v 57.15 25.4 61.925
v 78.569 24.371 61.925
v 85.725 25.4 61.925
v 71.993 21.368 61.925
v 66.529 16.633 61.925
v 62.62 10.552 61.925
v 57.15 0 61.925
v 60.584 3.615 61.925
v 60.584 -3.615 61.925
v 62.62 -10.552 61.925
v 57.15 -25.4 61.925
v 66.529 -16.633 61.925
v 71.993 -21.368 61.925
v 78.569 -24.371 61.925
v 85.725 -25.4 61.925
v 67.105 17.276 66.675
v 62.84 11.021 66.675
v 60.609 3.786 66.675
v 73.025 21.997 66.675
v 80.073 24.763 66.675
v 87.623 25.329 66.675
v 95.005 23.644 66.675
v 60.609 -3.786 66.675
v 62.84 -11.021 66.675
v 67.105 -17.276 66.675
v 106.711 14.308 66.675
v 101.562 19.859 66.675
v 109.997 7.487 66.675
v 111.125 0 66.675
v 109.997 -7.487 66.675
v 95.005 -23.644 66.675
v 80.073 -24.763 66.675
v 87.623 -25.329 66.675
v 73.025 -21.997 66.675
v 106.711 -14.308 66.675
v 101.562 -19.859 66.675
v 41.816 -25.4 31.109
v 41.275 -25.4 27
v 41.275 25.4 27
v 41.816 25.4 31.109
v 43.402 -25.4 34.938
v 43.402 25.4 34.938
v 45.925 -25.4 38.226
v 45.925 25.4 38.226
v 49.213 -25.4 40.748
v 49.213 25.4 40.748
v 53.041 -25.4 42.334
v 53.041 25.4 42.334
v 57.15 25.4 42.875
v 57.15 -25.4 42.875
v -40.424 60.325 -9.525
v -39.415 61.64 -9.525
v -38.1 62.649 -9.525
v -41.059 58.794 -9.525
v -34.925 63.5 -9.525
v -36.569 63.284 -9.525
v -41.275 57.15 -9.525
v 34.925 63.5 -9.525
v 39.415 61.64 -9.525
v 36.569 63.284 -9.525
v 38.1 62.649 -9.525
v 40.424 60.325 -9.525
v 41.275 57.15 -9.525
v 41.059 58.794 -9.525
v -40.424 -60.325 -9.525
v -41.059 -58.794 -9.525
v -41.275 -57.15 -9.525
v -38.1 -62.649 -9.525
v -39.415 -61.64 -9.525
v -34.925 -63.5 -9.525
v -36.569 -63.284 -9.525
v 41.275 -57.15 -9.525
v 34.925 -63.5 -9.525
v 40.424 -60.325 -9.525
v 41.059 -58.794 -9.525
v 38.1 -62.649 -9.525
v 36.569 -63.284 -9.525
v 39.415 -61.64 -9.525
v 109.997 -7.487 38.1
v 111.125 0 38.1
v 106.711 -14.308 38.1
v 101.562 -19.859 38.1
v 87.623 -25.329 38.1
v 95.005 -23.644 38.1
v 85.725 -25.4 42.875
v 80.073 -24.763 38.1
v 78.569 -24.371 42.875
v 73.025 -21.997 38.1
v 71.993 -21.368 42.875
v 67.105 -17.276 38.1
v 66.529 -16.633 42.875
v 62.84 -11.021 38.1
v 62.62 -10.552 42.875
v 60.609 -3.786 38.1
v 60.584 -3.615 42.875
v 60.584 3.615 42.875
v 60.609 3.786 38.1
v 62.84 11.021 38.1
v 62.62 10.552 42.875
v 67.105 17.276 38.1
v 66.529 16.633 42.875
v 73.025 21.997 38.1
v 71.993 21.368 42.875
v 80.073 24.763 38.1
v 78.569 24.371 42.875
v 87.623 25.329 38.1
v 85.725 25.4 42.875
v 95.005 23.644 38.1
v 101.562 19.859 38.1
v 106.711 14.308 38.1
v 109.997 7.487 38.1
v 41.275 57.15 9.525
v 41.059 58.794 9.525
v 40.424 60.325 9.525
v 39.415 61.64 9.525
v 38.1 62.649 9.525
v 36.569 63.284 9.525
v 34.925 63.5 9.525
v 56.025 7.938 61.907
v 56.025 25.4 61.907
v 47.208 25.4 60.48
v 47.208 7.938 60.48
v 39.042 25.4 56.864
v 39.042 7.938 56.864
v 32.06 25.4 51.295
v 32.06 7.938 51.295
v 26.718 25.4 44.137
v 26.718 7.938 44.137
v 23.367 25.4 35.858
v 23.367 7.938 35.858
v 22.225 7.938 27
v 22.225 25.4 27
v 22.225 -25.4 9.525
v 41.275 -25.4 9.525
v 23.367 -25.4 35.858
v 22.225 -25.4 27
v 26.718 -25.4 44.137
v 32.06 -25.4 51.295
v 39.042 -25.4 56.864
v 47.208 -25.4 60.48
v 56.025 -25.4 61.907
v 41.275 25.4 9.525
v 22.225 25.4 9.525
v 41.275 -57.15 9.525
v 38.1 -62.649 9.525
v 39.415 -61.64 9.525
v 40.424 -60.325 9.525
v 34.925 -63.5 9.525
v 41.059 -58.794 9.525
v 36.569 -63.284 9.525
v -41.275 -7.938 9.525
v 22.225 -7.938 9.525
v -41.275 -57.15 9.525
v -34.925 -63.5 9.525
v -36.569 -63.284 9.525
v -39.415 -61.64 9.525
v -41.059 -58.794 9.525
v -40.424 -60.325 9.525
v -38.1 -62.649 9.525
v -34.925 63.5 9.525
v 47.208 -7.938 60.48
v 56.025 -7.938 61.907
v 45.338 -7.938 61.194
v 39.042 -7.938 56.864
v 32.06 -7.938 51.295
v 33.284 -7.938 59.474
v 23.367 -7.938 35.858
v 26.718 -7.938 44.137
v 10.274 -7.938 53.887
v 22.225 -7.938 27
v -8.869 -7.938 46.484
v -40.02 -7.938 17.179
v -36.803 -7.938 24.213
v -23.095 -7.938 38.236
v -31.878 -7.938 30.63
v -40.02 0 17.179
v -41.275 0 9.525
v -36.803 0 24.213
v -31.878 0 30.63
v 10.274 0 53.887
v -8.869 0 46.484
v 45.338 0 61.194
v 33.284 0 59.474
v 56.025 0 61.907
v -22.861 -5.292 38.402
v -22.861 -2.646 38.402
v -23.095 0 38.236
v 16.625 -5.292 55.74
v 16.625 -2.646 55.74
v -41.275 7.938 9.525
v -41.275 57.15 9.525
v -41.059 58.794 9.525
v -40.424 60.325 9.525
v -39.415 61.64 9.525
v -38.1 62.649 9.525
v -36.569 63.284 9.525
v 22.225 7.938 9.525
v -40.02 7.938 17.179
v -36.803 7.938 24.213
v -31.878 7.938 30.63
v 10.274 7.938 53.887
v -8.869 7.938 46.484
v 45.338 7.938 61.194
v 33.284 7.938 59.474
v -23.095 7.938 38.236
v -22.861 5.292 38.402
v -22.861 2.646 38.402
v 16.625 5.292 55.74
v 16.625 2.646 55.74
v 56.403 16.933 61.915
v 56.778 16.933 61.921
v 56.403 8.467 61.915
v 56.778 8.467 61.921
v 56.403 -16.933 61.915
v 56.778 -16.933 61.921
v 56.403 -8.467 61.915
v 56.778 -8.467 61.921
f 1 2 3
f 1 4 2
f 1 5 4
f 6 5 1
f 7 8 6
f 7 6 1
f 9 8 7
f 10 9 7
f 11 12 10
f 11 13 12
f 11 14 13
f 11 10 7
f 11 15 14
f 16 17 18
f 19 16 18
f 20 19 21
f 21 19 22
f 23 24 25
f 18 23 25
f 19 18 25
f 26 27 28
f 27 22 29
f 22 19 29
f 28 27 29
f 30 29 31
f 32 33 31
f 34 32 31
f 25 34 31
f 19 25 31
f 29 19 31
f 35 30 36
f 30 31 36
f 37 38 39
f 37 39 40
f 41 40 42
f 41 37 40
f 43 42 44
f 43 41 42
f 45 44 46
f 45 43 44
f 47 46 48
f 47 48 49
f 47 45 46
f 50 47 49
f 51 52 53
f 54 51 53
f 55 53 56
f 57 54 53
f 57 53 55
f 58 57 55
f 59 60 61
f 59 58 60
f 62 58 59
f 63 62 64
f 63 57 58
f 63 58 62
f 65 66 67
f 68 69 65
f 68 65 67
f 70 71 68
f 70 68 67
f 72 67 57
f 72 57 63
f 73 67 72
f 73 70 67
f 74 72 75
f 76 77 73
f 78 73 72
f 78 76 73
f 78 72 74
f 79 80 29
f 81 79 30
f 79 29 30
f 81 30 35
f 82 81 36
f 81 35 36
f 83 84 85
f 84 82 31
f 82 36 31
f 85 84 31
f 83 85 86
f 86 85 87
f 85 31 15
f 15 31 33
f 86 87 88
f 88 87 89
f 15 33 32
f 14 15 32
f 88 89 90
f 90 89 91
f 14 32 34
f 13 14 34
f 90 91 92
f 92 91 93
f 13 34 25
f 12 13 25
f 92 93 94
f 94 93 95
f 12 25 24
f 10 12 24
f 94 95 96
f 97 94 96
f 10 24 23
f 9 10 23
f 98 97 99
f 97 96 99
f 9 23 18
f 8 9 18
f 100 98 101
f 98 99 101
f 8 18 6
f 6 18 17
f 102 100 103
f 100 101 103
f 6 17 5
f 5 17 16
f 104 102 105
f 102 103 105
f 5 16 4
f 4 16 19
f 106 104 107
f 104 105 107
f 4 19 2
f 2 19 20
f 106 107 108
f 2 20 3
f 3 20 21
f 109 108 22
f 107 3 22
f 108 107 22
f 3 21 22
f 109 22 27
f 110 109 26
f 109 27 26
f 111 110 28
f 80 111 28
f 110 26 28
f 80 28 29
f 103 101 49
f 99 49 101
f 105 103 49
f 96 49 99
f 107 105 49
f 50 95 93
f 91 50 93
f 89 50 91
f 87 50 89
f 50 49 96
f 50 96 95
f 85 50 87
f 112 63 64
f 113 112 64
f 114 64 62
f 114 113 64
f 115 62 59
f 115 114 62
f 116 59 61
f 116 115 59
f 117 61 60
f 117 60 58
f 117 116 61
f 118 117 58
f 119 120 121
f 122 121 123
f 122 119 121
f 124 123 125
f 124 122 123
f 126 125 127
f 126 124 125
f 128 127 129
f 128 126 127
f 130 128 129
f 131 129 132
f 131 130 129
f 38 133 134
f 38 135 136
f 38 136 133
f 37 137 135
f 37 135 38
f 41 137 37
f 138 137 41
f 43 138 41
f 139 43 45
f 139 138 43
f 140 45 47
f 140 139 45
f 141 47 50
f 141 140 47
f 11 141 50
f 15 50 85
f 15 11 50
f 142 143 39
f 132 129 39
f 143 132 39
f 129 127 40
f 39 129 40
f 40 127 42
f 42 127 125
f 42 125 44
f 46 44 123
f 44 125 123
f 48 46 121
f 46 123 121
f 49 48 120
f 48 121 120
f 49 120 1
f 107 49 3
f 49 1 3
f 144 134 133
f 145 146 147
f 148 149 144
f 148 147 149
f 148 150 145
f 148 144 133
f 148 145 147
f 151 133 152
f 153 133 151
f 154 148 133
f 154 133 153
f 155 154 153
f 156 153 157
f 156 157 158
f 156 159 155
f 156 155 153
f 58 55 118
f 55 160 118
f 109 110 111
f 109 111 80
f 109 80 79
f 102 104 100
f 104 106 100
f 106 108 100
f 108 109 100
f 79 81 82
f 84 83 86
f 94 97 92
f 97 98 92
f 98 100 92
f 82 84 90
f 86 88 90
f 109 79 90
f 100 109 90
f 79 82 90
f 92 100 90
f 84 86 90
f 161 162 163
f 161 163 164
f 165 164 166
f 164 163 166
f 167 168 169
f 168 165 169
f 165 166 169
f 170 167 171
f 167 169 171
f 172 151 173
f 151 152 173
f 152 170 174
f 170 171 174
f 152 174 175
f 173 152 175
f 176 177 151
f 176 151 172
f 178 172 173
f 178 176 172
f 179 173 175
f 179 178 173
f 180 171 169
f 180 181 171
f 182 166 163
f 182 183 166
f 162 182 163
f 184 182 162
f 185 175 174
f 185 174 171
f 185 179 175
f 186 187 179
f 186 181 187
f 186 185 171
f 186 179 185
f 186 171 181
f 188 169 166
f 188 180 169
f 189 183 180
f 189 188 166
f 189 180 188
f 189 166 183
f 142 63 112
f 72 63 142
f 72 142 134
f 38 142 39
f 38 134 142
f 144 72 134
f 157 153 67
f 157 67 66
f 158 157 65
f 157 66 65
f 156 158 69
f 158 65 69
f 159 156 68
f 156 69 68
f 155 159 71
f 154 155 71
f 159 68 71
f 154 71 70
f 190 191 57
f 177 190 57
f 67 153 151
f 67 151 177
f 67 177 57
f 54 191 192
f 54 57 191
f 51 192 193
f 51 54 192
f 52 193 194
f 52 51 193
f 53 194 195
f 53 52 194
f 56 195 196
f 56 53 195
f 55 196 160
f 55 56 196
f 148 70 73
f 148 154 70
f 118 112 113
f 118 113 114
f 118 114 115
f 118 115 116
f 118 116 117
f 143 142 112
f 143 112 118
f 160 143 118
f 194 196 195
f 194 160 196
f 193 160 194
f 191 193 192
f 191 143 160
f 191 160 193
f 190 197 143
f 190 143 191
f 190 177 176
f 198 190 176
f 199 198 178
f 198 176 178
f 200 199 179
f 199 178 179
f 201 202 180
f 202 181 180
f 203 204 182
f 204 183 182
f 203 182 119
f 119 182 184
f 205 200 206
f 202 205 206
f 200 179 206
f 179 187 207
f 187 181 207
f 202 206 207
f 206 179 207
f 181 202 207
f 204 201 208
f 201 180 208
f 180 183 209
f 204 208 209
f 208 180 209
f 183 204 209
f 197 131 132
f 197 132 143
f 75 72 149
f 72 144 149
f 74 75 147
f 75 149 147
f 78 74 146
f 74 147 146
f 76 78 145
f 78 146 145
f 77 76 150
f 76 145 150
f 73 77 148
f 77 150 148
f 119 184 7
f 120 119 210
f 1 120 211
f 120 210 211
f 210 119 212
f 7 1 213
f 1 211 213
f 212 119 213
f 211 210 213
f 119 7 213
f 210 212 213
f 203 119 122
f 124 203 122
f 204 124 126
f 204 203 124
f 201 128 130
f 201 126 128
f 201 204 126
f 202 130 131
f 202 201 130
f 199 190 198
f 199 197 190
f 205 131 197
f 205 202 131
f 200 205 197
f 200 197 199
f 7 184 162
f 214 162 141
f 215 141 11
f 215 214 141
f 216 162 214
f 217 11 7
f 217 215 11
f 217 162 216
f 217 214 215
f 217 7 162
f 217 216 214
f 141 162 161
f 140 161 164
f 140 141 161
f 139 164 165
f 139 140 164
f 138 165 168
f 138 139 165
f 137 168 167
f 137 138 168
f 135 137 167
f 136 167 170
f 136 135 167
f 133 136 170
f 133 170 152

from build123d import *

# Parameters (mm, degrees)
F1_DEPTH = 63.5
F2_DEPTH = 25.4
F3_DEPTH = 7.9375
F5_R     = 6.35


with BuildPart() as f1:
    # F0 (on Front) → F1 (new body, symmetric)
    with BuildSketch(Plane.XZ):
        Polygon((-41.275, -9.525), (41.275, -9.525), (41.275, 9.525), (22.225, 9.525), (-41.275, 9.525), align=None)
    extrude(amount=F1_DEPTH, both=True)

    # F0 (on Front) → F2 (join, symmetric)
    with BuildSketch(Plane.XZ):
        with BuildLine():
            Line((22.225, 9.525), (41.275, 9.525))
            Line((41.275, 9.525), (41.275, 27.0002))
            ThreePointArc((41.275, 27.0002), (45.92468, 38.22552), (57.15, 42.8752))
            Line((57.15, 42.8752), (60.325, 42.8752))
            Line((60.325, 42.8752), (60.325, 61.9252))
            Line((60.325, 61.9252), (57.15, 61.9252))
            add(Edge.make_bspline(
                [(56.025, 61.907076), (56.404449, 61.915352), (56.7795, 61.921393), (57.15, 61.9252)],
                knots=[110.209963, 110.209963, 110.209963, 110.209963, 111.504536, 111.504536, 111.504536, 111.504536], degree=3))
            ThreePointArc((56.025, 61.907076), (32.059701, 51.294901), (22.225, 27.0002))
            Line((22.225, 27.0002), (22.225, 9.525))
        make_face()
        Polygon((60.325, 61.9252), (60.325, 42.8752), (70.739483, 42.8752), (85.725, 42.8752), (85.725, 52.3875), (85.725, 61.9252), (70.739483, 61.9252), align=None)
    extrude(amount=F2_DEPTH, both=True)

    # F0 (on Front) → F3 (join, symmetric)
    with BuildSketch(Plane.XZ):
        with BuildLine():
            add(Edge.make_bspline(
                [(-41.275, 9.525), (-40.450122, 44.294677), (23.721684, 61.202513), (56.025, 61.907076)],
                knots=[0, 0, 0, 0, 110.209963, 110.209963, 110.209963, 110.209963], degree=3))
            Line((-41.275, 9.525), (22.225, 9.525))
            Line((22.225, 9.525), (22.225, 27.0002))
            ThreePointArc((22.225, 27.0002), (32.059701, 51.294901), (56.025, 61.907076))
        make_face()
    extrude(amount=F3_DEPTH, both=True)

    # F0 (on Front) → F4 (revolve)
    with BuildSketch(Plane.XZ):
        Polygon((85.725, 42.8752), (85.725, 38.1), (111.125, 38.1), (111.125, 66.675), (85.725, 66.675), (85.725, 61.9252), (85.725, 52.3875), align=None)
    revolve(axis=Axis((85.725, 0, 40.4876), (0, 0, -1)))

    # F5
    f5_edges = [f1.edges().sort_by_distance(p)[0] for p in [
        (-41.275, -63.5, 0),
        (41.275, -63.5, 0),
        (41.275, 63.5, 0),
        (-41.275, 63.5, 0),
    ]]
    fillet(f5_edges, radius=F5_R)


solid = f1.part
